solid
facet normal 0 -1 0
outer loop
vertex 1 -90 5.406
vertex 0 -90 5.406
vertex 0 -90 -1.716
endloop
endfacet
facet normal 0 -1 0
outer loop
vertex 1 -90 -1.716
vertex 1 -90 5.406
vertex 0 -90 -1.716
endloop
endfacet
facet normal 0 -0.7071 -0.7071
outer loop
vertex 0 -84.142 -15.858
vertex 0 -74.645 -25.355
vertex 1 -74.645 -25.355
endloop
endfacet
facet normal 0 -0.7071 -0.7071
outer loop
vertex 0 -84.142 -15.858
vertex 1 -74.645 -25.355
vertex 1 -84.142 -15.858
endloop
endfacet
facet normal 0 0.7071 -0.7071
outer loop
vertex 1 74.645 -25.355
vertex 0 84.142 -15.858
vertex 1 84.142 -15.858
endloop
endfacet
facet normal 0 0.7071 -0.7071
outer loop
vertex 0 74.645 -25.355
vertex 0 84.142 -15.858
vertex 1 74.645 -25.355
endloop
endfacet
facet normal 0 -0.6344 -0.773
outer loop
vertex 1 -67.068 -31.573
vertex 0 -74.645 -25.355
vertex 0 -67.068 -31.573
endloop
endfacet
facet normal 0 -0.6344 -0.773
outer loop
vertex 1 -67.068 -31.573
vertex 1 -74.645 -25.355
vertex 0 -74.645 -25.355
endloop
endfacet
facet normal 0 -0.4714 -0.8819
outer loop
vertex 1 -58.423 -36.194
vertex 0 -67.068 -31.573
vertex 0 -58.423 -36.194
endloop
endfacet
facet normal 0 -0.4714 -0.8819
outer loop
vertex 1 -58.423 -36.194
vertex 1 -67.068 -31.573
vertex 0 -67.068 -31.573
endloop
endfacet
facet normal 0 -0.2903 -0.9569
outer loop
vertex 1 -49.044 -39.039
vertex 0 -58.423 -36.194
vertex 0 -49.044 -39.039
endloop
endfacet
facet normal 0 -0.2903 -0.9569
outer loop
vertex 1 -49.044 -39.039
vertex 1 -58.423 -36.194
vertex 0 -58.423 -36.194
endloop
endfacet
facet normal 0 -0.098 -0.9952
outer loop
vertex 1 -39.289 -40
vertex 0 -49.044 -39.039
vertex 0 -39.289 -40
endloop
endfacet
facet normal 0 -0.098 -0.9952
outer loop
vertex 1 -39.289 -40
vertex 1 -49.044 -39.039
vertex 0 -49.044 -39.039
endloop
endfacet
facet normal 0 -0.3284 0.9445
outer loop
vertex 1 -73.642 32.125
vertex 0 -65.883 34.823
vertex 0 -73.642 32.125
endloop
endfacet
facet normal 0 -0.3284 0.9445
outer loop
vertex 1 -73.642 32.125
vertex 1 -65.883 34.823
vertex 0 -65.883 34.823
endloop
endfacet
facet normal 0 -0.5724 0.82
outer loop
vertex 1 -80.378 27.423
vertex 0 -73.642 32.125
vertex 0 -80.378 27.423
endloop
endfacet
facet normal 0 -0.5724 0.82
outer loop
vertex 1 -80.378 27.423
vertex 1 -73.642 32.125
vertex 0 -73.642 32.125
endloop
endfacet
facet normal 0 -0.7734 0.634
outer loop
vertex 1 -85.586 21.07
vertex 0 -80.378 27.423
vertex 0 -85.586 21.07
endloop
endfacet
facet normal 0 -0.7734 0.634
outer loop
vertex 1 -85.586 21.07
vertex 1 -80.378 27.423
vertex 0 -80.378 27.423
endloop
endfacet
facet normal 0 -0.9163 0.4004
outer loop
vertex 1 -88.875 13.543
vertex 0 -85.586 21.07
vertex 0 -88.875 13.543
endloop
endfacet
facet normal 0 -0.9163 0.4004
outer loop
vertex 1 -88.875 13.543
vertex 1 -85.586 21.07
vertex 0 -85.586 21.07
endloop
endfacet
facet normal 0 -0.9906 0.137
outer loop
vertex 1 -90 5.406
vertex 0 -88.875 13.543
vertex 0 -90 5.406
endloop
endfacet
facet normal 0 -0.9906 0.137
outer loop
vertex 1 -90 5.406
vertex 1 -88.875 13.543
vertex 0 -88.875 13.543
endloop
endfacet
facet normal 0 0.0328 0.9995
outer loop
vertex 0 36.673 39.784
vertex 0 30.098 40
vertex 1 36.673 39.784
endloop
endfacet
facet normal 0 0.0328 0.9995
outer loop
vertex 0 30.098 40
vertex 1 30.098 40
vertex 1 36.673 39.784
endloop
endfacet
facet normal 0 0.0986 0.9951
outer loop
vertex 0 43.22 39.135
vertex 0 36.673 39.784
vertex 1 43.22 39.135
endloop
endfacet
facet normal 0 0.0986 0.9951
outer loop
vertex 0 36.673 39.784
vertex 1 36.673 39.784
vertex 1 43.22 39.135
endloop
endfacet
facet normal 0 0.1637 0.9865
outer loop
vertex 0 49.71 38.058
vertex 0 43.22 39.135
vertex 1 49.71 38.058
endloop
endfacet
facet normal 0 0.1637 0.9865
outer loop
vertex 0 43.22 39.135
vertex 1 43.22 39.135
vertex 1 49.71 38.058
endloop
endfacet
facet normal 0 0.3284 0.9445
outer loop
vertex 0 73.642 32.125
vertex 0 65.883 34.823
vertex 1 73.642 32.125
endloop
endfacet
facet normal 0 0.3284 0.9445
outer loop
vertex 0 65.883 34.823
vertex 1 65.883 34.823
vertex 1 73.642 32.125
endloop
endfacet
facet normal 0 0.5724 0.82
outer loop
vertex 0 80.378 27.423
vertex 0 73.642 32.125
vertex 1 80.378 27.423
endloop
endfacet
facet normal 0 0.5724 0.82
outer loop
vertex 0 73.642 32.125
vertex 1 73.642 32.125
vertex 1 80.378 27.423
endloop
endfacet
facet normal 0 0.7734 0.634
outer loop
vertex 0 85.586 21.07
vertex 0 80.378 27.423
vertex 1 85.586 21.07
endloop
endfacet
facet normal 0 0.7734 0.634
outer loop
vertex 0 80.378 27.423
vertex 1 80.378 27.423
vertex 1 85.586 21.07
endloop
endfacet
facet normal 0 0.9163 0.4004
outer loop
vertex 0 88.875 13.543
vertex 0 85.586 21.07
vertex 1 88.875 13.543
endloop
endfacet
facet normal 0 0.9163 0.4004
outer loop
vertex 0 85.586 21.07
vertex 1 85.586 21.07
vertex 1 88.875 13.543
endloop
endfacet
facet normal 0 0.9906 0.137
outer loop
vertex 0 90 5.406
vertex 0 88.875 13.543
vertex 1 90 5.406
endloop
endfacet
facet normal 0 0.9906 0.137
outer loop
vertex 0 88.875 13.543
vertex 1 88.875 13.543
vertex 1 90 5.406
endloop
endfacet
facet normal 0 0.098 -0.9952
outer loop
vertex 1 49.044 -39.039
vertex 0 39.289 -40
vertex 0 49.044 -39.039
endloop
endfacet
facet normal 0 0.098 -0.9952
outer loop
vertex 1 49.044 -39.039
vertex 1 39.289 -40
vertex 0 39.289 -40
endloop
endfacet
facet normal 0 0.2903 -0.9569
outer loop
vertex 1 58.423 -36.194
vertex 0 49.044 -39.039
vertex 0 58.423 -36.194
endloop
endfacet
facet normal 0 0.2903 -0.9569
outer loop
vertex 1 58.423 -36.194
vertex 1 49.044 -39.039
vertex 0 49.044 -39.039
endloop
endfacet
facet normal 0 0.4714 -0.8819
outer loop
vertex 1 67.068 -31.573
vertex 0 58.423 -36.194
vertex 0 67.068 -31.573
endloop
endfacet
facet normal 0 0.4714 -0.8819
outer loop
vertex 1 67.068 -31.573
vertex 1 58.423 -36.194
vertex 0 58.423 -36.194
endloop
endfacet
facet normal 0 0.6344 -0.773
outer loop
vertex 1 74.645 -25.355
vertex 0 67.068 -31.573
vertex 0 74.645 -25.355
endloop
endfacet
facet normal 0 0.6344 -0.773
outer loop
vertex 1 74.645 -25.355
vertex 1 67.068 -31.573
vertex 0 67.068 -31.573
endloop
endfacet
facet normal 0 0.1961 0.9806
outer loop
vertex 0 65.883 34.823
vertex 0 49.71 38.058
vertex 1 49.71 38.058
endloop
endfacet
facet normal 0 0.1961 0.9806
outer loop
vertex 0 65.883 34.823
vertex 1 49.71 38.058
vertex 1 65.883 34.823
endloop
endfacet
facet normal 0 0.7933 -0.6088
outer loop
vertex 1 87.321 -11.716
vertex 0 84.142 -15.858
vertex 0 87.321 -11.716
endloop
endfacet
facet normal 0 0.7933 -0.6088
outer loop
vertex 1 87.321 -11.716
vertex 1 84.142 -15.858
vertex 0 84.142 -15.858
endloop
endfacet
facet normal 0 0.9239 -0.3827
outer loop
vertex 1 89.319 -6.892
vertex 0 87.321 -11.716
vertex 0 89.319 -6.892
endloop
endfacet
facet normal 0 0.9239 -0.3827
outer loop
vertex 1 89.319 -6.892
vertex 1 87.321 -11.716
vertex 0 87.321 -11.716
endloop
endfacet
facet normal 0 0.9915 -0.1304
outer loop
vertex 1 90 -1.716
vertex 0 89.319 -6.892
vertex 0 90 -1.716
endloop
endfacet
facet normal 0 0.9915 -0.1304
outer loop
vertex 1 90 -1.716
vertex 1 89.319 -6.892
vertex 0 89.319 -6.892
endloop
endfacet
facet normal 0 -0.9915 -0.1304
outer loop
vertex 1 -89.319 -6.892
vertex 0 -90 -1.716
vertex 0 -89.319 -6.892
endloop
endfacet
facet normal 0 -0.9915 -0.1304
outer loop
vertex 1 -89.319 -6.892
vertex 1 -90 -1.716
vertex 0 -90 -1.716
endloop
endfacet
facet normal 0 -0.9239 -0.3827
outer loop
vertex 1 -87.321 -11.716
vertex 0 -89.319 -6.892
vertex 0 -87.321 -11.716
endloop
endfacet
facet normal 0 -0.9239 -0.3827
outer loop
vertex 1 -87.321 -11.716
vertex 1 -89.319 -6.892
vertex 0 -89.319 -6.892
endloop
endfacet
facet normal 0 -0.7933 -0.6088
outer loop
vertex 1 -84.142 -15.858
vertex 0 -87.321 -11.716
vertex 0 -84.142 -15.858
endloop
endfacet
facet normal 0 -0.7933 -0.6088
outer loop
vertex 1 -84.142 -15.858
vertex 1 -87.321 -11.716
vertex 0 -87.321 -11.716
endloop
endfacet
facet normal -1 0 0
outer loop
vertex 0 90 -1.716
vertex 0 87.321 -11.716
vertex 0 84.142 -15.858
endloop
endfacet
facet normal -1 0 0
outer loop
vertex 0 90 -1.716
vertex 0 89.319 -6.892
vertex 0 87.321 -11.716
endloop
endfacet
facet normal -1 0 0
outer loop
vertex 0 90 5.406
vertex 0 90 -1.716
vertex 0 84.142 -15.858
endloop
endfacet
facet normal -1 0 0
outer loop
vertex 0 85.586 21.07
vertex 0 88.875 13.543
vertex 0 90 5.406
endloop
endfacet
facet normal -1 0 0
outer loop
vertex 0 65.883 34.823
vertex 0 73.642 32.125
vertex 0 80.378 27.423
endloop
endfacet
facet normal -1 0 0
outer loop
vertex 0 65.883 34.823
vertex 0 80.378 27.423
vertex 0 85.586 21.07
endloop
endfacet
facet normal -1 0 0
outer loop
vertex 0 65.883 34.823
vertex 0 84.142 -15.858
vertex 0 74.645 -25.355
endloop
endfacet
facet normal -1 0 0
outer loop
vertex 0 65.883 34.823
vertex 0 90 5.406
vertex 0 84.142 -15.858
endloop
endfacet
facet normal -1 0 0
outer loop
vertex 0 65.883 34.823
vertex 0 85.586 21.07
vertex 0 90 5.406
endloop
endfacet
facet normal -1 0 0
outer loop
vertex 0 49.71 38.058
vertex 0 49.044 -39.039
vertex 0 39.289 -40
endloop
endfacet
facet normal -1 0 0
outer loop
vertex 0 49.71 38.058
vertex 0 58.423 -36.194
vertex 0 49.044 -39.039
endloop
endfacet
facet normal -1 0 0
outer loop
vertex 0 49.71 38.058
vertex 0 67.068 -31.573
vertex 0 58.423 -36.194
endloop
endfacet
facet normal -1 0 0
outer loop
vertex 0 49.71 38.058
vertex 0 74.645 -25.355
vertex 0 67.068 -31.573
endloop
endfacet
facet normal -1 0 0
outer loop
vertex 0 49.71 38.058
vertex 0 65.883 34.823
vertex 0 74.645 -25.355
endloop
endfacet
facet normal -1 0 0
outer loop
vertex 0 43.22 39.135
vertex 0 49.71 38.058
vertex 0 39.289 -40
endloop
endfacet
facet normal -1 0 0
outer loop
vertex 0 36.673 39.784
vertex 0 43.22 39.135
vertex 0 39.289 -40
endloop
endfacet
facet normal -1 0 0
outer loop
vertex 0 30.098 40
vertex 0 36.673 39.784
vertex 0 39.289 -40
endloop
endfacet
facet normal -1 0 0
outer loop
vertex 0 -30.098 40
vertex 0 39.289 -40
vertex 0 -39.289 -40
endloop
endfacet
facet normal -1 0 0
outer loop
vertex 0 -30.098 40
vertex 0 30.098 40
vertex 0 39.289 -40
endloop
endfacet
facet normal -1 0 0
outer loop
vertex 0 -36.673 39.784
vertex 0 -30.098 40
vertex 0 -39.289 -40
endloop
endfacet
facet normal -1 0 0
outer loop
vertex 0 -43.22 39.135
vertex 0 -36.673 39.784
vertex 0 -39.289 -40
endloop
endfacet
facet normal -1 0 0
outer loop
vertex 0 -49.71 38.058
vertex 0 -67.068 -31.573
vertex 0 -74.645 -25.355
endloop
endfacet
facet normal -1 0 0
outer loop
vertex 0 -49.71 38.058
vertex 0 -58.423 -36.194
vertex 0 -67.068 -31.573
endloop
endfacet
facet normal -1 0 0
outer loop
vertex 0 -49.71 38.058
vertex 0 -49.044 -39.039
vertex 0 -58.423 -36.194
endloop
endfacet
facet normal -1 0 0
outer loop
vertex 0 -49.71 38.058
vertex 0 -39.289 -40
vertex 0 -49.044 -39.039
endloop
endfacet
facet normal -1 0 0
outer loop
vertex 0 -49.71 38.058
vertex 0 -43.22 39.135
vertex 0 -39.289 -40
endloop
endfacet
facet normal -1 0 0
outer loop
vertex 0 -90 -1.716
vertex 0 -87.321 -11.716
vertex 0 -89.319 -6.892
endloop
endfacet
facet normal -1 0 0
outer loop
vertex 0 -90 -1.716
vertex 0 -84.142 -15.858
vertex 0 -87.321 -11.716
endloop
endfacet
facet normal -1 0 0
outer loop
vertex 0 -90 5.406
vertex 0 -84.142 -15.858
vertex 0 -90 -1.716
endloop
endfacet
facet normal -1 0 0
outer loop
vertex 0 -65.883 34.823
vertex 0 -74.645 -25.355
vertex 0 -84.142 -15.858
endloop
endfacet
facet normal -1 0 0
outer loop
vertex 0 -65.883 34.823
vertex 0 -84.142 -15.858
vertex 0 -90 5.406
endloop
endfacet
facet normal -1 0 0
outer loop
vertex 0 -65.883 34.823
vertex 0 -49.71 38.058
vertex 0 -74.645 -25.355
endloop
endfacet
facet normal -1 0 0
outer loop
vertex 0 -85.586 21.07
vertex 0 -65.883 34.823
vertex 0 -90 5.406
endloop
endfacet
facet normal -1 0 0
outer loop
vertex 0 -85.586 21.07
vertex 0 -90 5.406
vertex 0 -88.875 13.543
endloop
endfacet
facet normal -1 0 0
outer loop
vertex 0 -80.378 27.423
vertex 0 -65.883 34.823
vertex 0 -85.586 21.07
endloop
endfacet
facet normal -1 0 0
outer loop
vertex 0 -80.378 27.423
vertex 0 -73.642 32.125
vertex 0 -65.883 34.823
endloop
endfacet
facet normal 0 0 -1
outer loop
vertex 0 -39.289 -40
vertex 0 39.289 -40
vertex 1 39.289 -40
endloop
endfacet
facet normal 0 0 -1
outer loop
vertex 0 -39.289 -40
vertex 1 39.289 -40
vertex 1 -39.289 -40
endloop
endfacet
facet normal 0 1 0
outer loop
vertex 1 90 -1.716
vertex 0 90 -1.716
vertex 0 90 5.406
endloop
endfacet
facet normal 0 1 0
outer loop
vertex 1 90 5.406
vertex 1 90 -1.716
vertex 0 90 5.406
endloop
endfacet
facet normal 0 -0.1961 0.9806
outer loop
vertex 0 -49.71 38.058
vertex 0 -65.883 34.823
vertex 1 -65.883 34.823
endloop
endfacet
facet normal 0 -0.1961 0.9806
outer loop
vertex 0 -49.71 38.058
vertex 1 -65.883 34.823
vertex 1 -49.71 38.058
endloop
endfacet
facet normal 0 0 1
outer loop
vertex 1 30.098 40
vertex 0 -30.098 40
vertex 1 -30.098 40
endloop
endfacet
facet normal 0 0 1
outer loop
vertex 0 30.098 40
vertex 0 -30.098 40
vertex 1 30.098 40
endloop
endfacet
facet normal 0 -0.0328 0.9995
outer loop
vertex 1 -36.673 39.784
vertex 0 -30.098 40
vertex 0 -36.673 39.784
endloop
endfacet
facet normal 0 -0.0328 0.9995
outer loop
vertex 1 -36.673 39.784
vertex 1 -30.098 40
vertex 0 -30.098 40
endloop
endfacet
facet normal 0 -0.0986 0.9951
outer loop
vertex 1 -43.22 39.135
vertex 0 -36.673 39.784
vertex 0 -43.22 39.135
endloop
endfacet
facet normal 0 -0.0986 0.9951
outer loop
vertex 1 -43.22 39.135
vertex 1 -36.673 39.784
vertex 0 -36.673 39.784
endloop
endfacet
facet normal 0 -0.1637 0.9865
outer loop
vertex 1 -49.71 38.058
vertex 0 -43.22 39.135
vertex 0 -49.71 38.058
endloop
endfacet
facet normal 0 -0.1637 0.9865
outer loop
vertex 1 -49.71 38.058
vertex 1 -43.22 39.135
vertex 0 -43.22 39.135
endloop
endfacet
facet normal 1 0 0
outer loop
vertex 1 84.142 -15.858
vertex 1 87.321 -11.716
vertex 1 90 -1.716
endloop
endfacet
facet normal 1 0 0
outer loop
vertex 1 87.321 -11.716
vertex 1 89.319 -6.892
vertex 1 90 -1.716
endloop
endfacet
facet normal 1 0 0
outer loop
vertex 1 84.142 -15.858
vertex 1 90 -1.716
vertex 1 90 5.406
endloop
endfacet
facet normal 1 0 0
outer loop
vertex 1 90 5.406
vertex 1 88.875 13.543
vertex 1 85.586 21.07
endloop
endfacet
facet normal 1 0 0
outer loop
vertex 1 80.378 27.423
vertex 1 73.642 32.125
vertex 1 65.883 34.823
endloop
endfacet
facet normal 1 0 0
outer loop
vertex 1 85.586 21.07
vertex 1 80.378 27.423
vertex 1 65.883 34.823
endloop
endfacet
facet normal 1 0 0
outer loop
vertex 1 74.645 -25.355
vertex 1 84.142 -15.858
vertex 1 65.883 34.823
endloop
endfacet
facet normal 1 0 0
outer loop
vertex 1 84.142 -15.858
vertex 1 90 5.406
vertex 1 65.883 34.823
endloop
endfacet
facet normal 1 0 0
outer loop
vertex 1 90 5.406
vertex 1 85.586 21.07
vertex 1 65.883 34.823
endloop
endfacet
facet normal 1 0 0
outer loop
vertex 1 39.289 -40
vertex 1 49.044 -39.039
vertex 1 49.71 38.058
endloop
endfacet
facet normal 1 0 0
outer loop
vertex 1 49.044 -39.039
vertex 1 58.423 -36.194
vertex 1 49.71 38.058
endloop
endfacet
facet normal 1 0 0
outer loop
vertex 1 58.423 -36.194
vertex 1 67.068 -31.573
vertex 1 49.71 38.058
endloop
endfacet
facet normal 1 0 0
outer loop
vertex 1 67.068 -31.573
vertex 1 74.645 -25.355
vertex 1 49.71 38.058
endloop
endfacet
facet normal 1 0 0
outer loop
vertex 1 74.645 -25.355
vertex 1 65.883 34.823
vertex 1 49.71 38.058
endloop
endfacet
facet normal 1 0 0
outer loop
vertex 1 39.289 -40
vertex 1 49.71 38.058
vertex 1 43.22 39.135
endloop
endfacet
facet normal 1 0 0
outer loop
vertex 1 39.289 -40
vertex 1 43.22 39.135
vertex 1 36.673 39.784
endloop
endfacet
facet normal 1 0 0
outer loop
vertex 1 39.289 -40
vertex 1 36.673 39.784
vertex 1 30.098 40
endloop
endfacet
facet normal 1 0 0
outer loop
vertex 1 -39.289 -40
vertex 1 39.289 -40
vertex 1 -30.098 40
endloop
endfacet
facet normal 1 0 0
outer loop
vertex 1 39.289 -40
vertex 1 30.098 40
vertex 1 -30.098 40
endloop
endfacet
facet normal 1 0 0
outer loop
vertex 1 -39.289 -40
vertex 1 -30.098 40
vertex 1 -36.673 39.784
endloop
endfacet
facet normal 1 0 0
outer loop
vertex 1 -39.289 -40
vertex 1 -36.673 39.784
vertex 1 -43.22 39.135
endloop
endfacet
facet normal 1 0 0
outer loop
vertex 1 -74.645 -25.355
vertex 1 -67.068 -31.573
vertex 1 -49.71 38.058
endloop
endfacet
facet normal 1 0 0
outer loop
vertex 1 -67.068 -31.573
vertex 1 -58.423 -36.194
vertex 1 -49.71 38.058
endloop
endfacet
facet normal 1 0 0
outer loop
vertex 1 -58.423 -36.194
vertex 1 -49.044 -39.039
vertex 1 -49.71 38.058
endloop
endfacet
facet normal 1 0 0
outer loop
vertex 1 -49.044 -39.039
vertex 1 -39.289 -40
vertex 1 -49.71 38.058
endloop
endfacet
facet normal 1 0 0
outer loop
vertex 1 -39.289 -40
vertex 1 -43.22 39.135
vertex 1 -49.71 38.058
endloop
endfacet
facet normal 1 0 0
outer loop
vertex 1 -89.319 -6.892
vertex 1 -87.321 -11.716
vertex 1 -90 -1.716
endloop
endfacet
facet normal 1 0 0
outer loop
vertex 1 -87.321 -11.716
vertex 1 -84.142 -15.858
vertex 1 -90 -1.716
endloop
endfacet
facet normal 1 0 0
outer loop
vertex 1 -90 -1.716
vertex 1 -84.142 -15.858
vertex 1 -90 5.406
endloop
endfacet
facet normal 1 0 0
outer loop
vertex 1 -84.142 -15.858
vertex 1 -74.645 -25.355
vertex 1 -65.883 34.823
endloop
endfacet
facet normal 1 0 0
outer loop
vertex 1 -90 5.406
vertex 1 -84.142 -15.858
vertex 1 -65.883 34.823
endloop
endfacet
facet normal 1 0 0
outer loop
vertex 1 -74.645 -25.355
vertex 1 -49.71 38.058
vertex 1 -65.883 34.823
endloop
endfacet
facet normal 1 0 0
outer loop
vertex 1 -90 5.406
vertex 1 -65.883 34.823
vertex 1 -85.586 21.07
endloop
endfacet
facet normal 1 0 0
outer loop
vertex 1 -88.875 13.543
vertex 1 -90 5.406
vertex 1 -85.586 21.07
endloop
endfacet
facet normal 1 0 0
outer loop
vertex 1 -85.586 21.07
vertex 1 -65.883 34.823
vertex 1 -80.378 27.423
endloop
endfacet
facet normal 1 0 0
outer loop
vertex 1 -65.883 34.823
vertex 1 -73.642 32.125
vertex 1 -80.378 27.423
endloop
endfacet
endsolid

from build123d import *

# Parameters (mm, degrees)
BOSS_EXTRUDE1_DEPTH = 1
FILLET1_R           = 100
FILLET2_R           = 30
FILLET3_R           = 20
FILLET4_R           = 50


with BuildPart() as part:
    # Sketch1 → Boss-Extrude1 (new body)
    with BuildSketch(Plane.YZ):
        Polygon((-40, 40), (40, 40), (90, 30), (90, 0), (90, -10), (60, -40), (-60, -40), (-90, -10), (-90, 0), (-90, 30), align=None)
    extrude(amount=BOSS_EXTRUDE1_DEPTH)

    # Fillet1
    fillet1_edges = [part.edges().sort_by_distance(p)[0] for p in [
        (0.5, -40, 40),
        (0.5, 40, 40),
    ]]
    fillet(fillet1_edges, radius=FILLET1_R)

    # Fillet2
    fillet2_edges = [part.edges().sort_by_distance(p)[0] for p in [
        (0.5, 90, 30),
        (0.5, -90, 30),
    ]]
    fillet(fillet2_edges, radius=FILLET2_R)

    # Fillet3
    fillet3_edges = [part.edges().sort_by_distance(p)[0] for p in [
        (0.5, 90, -10),
        (0.5, -90, -10),
    ]]
    fillet(fillet3_edges, radius=FILLET3_R)

    # Fillet4
    fillet4_edges = [part.edges().sort_by_distance(p)[0] for p in [
        (0.5, 60, -40),
        (0.5, -60, -40),
    ]]
    fillet(fillet4_edges, radius=FILLET4_R)


solid = part.part
